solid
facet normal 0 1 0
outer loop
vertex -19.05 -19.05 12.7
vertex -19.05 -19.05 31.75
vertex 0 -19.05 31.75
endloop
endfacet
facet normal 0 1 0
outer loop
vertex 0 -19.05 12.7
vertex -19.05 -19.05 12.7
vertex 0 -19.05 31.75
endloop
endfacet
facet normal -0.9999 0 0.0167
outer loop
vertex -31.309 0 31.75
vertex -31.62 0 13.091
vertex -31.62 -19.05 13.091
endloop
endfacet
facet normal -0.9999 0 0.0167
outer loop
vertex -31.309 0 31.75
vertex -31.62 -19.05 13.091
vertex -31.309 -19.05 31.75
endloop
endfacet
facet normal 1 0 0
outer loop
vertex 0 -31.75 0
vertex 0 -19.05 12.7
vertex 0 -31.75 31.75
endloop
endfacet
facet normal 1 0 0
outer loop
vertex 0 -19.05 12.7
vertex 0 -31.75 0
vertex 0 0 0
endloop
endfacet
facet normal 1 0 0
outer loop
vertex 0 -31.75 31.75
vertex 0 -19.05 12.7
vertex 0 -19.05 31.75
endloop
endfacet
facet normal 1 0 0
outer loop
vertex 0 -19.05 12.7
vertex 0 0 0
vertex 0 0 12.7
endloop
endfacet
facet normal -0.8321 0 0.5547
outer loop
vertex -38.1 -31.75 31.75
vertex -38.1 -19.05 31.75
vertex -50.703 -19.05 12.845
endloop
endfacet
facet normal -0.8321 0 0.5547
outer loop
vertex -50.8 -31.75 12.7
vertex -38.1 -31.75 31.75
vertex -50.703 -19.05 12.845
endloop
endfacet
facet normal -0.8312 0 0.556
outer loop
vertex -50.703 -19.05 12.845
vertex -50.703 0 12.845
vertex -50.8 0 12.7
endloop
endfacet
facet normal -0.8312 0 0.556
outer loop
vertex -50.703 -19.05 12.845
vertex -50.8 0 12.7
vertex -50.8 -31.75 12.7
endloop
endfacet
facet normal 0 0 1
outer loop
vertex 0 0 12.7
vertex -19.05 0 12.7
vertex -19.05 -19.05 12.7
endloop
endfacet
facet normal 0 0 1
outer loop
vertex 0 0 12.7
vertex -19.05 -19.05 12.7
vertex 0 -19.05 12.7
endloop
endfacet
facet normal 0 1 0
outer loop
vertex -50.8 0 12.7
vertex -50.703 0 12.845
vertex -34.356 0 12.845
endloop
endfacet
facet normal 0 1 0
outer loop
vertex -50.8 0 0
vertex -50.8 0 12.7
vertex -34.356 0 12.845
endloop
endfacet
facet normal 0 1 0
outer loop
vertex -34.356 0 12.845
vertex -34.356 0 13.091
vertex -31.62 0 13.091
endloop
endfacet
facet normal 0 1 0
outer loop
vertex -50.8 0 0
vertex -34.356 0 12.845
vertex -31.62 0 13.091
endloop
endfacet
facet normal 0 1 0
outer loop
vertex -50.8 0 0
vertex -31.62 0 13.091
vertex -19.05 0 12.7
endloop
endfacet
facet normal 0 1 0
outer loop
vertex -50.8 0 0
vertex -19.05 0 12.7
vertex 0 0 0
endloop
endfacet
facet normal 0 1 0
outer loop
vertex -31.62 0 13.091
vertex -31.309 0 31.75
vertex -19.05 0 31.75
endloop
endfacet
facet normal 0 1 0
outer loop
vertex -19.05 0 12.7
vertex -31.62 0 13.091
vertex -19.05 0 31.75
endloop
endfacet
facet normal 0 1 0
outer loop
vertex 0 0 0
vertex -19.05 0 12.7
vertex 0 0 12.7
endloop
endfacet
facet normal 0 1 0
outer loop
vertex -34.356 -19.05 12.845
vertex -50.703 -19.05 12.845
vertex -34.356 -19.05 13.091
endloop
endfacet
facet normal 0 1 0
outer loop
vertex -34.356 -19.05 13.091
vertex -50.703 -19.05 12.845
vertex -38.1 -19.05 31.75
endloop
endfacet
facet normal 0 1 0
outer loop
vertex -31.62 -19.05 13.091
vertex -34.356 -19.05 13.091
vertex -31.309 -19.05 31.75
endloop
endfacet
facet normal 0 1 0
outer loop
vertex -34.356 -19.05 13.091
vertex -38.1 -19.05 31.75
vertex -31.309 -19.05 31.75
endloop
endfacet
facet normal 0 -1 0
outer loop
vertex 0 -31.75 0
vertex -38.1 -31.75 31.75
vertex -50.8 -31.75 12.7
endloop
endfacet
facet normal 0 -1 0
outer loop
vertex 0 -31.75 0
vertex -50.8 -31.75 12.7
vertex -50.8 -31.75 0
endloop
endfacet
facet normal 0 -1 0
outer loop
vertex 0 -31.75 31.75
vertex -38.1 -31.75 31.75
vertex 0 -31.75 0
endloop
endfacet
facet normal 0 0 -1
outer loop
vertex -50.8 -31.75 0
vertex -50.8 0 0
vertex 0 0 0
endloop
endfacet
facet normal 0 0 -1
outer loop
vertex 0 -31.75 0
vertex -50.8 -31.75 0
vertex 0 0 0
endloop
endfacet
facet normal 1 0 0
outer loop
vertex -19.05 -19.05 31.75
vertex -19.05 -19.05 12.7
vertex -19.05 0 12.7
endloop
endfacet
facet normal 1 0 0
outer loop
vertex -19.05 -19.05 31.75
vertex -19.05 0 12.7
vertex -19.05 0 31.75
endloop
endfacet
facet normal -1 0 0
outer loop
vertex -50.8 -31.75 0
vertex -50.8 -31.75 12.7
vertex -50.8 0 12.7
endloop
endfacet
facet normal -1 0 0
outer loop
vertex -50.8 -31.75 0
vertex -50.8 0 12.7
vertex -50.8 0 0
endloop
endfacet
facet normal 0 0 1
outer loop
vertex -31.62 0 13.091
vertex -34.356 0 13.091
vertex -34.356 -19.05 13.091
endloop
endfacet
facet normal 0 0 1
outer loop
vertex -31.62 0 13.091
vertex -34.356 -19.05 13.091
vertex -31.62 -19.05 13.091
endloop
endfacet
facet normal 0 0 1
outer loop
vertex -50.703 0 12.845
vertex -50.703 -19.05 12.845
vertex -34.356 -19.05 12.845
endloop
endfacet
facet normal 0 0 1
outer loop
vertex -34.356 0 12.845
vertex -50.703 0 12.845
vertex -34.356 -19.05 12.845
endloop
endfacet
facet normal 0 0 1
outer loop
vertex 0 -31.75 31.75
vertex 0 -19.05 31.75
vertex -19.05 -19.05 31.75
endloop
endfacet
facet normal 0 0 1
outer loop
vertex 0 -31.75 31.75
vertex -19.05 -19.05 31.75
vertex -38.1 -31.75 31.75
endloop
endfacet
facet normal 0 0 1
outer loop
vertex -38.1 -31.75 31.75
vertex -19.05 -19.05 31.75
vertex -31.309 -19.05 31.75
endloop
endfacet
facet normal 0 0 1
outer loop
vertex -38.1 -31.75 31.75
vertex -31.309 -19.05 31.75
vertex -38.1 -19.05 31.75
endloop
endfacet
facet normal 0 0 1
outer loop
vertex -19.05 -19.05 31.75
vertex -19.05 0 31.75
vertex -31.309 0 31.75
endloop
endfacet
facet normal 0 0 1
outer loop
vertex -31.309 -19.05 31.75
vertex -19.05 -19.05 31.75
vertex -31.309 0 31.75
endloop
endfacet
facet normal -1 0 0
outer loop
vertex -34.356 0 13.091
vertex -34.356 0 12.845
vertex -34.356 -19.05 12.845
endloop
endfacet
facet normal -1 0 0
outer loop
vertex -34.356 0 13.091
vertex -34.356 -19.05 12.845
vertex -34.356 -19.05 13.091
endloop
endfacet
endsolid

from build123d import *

# Parameters (mm, degrees)
F1_DEPTH = 31.75
F2_W     = 19.05
F2_H     = 19.05
F3_DEPTH = 19.05
F5_DEPTH = 19.05
F7_DEPTH = 19.05


# Not quite as in the source:
# - a length typed as a fraction of an inch, garbled in the dataset ("3 / 203.2 mm" for 3/8 in), is restored


with BuildPart() as f1:
    # F0 (on Front) → F1 (new body)
    with BuildSketch(Plane.XZ):
        Polygon((-50.8, 0), (0, 0), (0, 31.75), (-38.1, 31.75), (-50.8, 12.7), align=None)
    extrude(amount=F1_DEPTH)

    # F2 (on Front) → F3 (cut)
    with BuildSketch(Plane.XZ):
        with Locations((-9.525, 22.225)):
            Rectangle(F2_W, F2_H)
    extrude(amount=F3_DEPTH, mode=Mode.SUBTRACT)

    # F4 (on Front) → F5 (cut)
    with BuildSketch(Plane.XZ):
        Polygon((-31.6195416782, 13.0910674021), (-31.3020864666, 32.1384221315), (-37.6520864666, 32.1384221315), (-50.6695416782, 13.0910674021), align=None)
    extrude(amount=F5_DEPTH, mode=Mode.SUBTRACT)

    # F6 (on Front) → F7 (cut)
    with BuildSketch(Plane.XZ):
        Polygon((-34.3563221395, 12.8449322656), (-34.3563221395, 35.7176738393), (-68.0936202407, 12.8449322656), align=None)
    extrude(amount=F7_DEPTH, mode=Mode.SUBTRACT)


solid = f1.part
